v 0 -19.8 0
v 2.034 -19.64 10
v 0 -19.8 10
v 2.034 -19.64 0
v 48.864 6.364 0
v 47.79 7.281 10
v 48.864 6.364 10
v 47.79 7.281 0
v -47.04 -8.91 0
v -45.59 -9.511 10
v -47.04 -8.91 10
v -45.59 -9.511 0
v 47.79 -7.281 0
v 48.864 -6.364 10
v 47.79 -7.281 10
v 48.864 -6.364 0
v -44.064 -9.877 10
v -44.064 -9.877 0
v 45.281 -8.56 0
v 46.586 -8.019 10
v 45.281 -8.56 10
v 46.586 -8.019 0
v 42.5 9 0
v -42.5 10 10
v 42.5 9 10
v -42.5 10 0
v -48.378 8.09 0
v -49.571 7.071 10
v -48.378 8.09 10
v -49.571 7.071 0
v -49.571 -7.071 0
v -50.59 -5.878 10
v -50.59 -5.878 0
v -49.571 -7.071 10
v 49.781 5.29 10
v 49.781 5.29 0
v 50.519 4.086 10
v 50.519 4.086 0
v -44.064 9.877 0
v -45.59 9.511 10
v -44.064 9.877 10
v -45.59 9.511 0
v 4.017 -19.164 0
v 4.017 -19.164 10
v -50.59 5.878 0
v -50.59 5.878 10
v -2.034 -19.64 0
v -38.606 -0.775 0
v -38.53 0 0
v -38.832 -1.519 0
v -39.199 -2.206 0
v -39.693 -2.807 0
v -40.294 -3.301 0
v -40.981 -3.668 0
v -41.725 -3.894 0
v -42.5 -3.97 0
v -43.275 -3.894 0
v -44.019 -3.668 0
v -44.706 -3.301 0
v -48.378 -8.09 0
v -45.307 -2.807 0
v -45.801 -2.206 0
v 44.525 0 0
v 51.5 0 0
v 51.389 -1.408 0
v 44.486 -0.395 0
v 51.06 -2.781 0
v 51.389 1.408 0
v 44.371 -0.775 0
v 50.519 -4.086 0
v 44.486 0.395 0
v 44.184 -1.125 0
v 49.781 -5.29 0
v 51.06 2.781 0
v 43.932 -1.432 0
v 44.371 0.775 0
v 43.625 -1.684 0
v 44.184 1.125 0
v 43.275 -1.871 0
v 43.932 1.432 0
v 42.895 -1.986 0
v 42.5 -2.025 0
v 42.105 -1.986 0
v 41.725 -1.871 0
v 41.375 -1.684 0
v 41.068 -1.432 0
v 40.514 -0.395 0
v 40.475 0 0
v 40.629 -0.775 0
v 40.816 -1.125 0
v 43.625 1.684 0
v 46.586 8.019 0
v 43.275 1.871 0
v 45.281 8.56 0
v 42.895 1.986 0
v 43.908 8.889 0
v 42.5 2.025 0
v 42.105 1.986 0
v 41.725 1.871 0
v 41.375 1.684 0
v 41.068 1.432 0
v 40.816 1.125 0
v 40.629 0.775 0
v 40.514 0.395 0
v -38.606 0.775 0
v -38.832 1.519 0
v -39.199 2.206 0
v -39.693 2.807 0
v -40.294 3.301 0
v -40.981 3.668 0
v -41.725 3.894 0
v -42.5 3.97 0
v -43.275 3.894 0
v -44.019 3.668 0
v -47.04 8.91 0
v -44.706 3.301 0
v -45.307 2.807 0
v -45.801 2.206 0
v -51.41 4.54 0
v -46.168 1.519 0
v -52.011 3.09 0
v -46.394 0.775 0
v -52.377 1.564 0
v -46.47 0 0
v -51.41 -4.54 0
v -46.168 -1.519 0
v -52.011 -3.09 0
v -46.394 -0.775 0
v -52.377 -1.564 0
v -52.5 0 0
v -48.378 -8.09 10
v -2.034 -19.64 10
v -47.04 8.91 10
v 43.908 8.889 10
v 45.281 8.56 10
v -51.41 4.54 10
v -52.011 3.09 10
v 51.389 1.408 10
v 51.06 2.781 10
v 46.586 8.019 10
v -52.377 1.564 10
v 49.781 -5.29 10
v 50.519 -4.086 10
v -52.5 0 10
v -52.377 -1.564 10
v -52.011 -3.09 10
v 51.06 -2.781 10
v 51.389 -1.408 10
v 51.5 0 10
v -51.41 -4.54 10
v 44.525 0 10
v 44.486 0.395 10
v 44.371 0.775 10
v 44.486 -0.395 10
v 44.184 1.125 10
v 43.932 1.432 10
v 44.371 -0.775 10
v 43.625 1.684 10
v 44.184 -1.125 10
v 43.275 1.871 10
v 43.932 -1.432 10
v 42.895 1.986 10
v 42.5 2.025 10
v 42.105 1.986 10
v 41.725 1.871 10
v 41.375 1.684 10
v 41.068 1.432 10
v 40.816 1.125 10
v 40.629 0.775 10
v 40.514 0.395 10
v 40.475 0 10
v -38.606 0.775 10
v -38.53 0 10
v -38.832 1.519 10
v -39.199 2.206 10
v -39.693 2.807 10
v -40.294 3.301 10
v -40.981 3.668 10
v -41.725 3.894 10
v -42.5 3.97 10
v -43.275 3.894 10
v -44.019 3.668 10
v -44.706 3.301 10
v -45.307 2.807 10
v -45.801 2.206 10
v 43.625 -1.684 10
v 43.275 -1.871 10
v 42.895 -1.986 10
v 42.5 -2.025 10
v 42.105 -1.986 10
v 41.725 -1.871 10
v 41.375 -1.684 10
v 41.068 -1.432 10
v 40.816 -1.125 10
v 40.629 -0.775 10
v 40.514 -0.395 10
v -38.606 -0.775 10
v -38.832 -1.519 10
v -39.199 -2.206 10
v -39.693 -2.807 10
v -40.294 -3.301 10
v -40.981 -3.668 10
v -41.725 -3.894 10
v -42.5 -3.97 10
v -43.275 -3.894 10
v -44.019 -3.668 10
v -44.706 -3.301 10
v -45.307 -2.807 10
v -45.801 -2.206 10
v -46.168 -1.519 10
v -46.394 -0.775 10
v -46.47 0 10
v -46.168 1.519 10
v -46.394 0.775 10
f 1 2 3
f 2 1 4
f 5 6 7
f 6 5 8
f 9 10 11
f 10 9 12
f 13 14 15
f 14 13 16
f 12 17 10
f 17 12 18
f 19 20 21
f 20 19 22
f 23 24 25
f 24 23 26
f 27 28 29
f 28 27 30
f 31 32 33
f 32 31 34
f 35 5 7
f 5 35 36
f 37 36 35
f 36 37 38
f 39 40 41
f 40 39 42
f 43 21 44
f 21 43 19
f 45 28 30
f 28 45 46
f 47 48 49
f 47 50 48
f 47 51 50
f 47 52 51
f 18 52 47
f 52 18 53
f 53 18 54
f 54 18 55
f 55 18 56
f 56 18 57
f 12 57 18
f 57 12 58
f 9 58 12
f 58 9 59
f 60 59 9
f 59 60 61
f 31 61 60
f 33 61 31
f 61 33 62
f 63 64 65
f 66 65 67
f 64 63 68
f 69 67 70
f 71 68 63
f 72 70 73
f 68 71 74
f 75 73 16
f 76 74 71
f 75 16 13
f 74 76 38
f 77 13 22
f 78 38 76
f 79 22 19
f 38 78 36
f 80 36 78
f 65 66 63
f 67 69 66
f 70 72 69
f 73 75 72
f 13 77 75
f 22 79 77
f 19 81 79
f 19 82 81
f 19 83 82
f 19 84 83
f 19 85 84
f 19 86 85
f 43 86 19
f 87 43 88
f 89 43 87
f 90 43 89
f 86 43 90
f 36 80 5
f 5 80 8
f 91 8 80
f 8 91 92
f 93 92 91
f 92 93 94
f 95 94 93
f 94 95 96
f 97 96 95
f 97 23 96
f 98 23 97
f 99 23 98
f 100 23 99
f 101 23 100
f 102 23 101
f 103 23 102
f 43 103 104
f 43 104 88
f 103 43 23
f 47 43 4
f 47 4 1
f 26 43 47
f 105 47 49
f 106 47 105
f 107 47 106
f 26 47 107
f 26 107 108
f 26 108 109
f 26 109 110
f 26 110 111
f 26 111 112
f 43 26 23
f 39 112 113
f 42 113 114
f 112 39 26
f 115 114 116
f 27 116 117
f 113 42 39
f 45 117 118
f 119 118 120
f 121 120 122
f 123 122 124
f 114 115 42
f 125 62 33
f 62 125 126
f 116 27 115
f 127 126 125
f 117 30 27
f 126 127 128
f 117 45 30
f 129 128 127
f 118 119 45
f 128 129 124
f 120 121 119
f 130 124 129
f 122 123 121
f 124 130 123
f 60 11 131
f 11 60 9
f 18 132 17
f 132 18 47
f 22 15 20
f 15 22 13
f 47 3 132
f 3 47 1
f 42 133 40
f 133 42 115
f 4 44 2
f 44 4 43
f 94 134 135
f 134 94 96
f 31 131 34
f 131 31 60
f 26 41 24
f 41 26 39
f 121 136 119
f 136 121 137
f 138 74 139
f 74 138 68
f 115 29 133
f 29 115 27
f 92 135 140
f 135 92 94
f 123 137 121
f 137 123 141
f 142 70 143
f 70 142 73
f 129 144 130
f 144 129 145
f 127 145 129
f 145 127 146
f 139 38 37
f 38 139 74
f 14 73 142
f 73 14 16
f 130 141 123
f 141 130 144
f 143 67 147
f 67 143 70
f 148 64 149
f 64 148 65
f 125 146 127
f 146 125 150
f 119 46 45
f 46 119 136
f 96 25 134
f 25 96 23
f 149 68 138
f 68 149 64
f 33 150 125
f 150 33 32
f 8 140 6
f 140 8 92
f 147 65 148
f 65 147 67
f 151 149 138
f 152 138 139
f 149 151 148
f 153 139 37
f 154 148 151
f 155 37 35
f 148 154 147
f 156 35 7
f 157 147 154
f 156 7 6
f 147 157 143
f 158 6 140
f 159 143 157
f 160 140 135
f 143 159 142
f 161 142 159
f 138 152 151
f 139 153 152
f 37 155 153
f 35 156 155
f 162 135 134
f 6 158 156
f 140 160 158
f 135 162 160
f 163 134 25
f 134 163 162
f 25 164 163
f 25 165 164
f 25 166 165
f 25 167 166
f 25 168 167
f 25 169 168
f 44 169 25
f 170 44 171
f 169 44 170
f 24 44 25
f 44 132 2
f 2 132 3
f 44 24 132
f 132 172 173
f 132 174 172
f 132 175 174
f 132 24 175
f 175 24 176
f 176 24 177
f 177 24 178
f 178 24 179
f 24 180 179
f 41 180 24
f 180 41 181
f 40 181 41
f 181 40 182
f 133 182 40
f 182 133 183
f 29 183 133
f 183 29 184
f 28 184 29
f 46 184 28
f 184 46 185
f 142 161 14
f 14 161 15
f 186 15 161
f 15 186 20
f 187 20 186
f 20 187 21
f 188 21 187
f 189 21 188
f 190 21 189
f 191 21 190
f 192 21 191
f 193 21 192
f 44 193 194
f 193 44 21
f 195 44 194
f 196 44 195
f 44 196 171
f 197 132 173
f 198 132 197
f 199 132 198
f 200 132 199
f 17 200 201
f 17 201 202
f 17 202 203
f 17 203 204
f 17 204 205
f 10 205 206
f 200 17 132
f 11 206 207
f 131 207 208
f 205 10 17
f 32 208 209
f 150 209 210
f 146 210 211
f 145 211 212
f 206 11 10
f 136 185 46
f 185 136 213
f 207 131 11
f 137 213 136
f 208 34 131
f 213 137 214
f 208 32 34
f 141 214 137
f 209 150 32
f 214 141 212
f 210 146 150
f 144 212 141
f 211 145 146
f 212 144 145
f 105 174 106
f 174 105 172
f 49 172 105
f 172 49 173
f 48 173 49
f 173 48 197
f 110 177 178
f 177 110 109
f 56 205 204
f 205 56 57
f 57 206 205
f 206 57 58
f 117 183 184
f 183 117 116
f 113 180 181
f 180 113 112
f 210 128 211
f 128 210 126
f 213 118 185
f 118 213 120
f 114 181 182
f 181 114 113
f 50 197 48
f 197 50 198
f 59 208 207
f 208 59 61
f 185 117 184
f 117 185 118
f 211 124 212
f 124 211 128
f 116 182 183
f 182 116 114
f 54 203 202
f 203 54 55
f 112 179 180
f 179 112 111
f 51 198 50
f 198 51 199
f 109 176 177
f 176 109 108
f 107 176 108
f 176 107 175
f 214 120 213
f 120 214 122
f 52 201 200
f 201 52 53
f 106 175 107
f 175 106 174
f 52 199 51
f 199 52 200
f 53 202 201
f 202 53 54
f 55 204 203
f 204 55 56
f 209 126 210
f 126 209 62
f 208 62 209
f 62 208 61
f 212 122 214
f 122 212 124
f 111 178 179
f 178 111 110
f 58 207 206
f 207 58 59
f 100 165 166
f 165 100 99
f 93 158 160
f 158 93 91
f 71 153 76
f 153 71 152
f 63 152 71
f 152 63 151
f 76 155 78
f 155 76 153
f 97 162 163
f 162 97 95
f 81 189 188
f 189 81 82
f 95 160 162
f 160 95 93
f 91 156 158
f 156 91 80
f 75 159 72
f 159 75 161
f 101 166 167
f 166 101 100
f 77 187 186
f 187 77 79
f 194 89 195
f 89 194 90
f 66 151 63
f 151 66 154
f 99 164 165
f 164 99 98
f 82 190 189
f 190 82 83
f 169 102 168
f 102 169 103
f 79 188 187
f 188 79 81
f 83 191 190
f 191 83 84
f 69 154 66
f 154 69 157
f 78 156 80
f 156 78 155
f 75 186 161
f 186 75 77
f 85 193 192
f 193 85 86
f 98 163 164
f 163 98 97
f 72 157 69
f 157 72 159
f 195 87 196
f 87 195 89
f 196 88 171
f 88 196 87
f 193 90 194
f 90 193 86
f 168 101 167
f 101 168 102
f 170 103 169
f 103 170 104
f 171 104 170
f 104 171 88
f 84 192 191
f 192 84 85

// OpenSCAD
$fn = 32;

// ----------------------------------------------------------------------
// Lever: 85 mm between the bosses, 10 mm thick, smooth outline
// ----------------------------------------------------------------------

// --- parameters (mm) ---
lever_l = 85;             // distance between the boss centres
boss_a = 20;              // first boss diameter
boss_b = 18;              // second boss diameter
bore_a = 7.94;            // first bore
bore_b = 4.05;            // second bore
lever_t = 10;             // lever thickness
boss_c = 26;              // middle boss diameter
bend = 6.8;               // how far the middle boss drops

lever_profile = [[-52.5, 0], [-52.377, -1.564], [-52.011, -3.09], [-51.41, -4.54], [-50.59, -5.878], [-49.571, -7.071], [-48.378, -8.09], [-47.04, -8.91], [-45.59, -9.511], [-44.064, -9.877], [-2.034, -19.64], [0, -19.8], [2.034, -19.64], [4.017, -19.164], [45.281, -8.56], [46.586, -8.019], [47.79, -7.281], [48.864, -6.364], [49.781, -5.29], [50.519, -4.086], [51.06, -2.781], [51.389, -1.408], [51.5, 0], [51.389, 1.408], [51.06, 2.781], [50.519, 4.086], [49.781, 5.29], [48.864, 6.364], [47.79, 7.281], [46.586, 8.019], [45.281, 8.56], [43.908, 8.889], [42.5, 9], [-42.5, 10], [-44.064, 9.877], [-45.59, 9.511], [-47.04, 8.91], [-48.378, 8.09], [-49.571, 7.071], [-50.59, 5.878], [-51.41, 4.54], [-52.011, 3.09], [-52.377, 1.564]];

difference() {
  linear_extrude(height = lever_t) polygon(lever_profile);
  translate([-42.5, 0, -2.5]) cylinder(h = lever_t + 5, d = bore_a);
  translate([42.5, 0, -2.5]) cylinder(h = lever_t + 5, d = bore_b);
}
